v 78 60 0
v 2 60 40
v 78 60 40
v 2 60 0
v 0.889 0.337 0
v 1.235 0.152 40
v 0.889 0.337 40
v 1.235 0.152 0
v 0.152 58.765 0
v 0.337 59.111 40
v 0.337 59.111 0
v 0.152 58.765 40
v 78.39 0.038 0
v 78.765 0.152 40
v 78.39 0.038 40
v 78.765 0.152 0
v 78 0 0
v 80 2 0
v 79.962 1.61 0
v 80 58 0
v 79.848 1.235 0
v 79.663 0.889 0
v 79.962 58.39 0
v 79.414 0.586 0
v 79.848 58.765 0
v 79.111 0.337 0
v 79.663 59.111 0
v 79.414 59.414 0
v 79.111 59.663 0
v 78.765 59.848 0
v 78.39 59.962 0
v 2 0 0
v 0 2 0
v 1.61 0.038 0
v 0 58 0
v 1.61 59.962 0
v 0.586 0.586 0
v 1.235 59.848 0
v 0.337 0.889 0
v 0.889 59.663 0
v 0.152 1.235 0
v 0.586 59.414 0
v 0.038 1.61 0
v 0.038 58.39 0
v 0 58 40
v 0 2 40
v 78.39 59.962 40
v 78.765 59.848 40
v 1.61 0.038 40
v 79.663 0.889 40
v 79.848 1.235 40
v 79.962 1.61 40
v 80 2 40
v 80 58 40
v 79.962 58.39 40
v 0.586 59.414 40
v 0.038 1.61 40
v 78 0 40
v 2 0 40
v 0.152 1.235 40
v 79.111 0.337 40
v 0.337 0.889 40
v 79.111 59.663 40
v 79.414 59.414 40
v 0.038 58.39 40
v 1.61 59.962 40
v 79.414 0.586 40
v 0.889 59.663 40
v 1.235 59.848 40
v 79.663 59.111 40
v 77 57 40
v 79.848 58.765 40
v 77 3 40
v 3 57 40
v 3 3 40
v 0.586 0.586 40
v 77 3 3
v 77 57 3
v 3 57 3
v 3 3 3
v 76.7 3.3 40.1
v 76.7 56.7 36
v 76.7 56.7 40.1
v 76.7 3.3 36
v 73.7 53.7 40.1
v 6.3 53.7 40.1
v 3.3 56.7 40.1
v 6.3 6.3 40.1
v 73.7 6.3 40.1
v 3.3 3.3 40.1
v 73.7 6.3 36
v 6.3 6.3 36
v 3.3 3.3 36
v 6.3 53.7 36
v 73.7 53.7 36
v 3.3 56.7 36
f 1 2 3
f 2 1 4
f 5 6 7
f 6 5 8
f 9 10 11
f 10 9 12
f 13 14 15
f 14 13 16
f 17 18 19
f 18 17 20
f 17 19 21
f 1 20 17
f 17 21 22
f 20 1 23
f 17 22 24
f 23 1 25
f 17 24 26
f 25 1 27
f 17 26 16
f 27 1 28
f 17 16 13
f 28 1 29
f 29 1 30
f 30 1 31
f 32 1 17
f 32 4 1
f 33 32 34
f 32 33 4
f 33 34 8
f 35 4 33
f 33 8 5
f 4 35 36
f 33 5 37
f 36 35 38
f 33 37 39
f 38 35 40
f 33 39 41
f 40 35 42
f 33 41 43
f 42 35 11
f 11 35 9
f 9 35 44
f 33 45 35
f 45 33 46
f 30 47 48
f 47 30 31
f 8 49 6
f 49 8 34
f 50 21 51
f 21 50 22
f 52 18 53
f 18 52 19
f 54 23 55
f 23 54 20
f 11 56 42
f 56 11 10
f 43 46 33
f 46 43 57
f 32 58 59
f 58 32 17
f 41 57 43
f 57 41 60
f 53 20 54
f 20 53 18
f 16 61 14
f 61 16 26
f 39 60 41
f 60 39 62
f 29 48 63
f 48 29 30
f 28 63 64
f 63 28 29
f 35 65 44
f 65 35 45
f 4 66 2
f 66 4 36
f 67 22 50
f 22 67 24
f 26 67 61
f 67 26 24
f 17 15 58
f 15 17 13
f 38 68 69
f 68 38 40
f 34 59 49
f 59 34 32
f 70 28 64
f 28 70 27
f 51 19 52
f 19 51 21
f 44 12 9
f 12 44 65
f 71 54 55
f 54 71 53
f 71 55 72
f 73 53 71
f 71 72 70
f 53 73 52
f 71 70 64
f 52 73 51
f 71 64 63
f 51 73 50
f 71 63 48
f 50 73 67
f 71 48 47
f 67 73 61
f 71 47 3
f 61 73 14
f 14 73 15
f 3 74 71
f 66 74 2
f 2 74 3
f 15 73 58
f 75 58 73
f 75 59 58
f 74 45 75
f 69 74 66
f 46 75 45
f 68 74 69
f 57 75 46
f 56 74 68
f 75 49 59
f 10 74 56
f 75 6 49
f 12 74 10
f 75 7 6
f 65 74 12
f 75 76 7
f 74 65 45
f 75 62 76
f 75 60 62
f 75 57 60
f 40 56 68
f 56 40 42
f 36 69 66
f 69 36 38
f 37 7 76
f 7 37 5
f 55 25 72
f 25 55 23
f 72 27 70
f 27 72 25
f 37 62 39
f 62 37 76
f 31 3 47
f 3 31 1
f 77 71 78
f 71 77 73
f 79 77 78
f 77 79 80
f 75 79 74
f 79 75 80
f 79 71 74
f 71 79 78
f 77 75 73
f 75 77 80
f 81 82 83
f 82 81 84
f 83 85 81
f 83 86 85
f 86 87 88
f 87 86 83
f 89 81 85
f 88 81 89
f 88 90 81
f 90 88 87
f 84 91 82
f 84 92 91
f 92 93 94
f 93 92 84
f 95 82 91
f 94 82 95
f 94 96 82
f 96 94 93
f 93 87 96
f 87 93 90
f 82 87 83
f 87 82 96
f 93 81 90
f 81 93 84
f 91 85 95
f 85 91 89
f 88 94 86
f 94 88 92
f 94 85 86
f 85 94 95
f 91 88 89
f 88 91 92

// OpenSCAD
// ============================================================
// Parametric Box Template — 3D Printable / CNC
// ============================================================
// All dimensions in mm. Adjust variables below.
// Use: openscad -o box.stl box_parametric.scad

// ---- PARAMETERS ----
width  = 80;   // X dimension (mm)
depth  = 60;   // Y dimension (mm)
height = 40;   // Z dimension (mm)
wall   = 3;    // Wall thickness (mm)
base   = 3;    // Base thickness (mm)
fillet = 2;    // Corner fillet radius (0 = sharp)

// Print mode: "print3d" considers overhangs, "cnc" makes flat-bottom design
mode = "print3d"; // "print3d" | "cnc"

// Lid: include a lip for a snap-fit lid?
include_lid_lip = true;
lid_lip_height  = 4;    // Height of the lid lip (mm)
lid_clearance   = 0.3;  // Clearance between lid and box (mm)

// ---- BOX BODY ----
module box_body() {
    difference() {
        // Outer shell
        hull_box(width, depth, height, fillet);
        // Inner cavity
        translate([wall, wall, base])
            hull_box(width - wall*2, depth - wall*2, height - base + 0.1, max(0, fillet - wall));
    }
}

// ---- LID LIP (optional) ----
module lid_lip() {
    if (include_lid_lip) {
        translate([wall + lid_clearance, wall + lid_clearance, height - lid_lip_height])
            difference() {
                hull_box(width - (wall+lid_clearance)*2, depth - (wall+lid_clearance)*2, lid_lip_height + 0.1, max(0, fillet - wall - lid_clearance));
                translate([wall, wall, -0.1])
                    hull_box(width - (wall+lid_clearance)*2 - wall*2, depth - (wall+lid_clearance)*2 - wall*2, lid_lip_height + 0.3, max(0, fillet - wall*2 - lid_clearance));
            }
    }
}

// ---- ROUNDED BOX HELPER ----
module hull_box(w, d, h, r) {
    if (r <= 0) {
        cube([w, d, h]);
    } else {
        hull() {
            for (x = [r, w-r], y = [r, d-r]) {
                translate([x, y, 0]) cylinder(r=r, h=h, $fn=32);
            }
        }
    }
}

// ---- ASSEMBLE ----
box_body();
lid_lip();
